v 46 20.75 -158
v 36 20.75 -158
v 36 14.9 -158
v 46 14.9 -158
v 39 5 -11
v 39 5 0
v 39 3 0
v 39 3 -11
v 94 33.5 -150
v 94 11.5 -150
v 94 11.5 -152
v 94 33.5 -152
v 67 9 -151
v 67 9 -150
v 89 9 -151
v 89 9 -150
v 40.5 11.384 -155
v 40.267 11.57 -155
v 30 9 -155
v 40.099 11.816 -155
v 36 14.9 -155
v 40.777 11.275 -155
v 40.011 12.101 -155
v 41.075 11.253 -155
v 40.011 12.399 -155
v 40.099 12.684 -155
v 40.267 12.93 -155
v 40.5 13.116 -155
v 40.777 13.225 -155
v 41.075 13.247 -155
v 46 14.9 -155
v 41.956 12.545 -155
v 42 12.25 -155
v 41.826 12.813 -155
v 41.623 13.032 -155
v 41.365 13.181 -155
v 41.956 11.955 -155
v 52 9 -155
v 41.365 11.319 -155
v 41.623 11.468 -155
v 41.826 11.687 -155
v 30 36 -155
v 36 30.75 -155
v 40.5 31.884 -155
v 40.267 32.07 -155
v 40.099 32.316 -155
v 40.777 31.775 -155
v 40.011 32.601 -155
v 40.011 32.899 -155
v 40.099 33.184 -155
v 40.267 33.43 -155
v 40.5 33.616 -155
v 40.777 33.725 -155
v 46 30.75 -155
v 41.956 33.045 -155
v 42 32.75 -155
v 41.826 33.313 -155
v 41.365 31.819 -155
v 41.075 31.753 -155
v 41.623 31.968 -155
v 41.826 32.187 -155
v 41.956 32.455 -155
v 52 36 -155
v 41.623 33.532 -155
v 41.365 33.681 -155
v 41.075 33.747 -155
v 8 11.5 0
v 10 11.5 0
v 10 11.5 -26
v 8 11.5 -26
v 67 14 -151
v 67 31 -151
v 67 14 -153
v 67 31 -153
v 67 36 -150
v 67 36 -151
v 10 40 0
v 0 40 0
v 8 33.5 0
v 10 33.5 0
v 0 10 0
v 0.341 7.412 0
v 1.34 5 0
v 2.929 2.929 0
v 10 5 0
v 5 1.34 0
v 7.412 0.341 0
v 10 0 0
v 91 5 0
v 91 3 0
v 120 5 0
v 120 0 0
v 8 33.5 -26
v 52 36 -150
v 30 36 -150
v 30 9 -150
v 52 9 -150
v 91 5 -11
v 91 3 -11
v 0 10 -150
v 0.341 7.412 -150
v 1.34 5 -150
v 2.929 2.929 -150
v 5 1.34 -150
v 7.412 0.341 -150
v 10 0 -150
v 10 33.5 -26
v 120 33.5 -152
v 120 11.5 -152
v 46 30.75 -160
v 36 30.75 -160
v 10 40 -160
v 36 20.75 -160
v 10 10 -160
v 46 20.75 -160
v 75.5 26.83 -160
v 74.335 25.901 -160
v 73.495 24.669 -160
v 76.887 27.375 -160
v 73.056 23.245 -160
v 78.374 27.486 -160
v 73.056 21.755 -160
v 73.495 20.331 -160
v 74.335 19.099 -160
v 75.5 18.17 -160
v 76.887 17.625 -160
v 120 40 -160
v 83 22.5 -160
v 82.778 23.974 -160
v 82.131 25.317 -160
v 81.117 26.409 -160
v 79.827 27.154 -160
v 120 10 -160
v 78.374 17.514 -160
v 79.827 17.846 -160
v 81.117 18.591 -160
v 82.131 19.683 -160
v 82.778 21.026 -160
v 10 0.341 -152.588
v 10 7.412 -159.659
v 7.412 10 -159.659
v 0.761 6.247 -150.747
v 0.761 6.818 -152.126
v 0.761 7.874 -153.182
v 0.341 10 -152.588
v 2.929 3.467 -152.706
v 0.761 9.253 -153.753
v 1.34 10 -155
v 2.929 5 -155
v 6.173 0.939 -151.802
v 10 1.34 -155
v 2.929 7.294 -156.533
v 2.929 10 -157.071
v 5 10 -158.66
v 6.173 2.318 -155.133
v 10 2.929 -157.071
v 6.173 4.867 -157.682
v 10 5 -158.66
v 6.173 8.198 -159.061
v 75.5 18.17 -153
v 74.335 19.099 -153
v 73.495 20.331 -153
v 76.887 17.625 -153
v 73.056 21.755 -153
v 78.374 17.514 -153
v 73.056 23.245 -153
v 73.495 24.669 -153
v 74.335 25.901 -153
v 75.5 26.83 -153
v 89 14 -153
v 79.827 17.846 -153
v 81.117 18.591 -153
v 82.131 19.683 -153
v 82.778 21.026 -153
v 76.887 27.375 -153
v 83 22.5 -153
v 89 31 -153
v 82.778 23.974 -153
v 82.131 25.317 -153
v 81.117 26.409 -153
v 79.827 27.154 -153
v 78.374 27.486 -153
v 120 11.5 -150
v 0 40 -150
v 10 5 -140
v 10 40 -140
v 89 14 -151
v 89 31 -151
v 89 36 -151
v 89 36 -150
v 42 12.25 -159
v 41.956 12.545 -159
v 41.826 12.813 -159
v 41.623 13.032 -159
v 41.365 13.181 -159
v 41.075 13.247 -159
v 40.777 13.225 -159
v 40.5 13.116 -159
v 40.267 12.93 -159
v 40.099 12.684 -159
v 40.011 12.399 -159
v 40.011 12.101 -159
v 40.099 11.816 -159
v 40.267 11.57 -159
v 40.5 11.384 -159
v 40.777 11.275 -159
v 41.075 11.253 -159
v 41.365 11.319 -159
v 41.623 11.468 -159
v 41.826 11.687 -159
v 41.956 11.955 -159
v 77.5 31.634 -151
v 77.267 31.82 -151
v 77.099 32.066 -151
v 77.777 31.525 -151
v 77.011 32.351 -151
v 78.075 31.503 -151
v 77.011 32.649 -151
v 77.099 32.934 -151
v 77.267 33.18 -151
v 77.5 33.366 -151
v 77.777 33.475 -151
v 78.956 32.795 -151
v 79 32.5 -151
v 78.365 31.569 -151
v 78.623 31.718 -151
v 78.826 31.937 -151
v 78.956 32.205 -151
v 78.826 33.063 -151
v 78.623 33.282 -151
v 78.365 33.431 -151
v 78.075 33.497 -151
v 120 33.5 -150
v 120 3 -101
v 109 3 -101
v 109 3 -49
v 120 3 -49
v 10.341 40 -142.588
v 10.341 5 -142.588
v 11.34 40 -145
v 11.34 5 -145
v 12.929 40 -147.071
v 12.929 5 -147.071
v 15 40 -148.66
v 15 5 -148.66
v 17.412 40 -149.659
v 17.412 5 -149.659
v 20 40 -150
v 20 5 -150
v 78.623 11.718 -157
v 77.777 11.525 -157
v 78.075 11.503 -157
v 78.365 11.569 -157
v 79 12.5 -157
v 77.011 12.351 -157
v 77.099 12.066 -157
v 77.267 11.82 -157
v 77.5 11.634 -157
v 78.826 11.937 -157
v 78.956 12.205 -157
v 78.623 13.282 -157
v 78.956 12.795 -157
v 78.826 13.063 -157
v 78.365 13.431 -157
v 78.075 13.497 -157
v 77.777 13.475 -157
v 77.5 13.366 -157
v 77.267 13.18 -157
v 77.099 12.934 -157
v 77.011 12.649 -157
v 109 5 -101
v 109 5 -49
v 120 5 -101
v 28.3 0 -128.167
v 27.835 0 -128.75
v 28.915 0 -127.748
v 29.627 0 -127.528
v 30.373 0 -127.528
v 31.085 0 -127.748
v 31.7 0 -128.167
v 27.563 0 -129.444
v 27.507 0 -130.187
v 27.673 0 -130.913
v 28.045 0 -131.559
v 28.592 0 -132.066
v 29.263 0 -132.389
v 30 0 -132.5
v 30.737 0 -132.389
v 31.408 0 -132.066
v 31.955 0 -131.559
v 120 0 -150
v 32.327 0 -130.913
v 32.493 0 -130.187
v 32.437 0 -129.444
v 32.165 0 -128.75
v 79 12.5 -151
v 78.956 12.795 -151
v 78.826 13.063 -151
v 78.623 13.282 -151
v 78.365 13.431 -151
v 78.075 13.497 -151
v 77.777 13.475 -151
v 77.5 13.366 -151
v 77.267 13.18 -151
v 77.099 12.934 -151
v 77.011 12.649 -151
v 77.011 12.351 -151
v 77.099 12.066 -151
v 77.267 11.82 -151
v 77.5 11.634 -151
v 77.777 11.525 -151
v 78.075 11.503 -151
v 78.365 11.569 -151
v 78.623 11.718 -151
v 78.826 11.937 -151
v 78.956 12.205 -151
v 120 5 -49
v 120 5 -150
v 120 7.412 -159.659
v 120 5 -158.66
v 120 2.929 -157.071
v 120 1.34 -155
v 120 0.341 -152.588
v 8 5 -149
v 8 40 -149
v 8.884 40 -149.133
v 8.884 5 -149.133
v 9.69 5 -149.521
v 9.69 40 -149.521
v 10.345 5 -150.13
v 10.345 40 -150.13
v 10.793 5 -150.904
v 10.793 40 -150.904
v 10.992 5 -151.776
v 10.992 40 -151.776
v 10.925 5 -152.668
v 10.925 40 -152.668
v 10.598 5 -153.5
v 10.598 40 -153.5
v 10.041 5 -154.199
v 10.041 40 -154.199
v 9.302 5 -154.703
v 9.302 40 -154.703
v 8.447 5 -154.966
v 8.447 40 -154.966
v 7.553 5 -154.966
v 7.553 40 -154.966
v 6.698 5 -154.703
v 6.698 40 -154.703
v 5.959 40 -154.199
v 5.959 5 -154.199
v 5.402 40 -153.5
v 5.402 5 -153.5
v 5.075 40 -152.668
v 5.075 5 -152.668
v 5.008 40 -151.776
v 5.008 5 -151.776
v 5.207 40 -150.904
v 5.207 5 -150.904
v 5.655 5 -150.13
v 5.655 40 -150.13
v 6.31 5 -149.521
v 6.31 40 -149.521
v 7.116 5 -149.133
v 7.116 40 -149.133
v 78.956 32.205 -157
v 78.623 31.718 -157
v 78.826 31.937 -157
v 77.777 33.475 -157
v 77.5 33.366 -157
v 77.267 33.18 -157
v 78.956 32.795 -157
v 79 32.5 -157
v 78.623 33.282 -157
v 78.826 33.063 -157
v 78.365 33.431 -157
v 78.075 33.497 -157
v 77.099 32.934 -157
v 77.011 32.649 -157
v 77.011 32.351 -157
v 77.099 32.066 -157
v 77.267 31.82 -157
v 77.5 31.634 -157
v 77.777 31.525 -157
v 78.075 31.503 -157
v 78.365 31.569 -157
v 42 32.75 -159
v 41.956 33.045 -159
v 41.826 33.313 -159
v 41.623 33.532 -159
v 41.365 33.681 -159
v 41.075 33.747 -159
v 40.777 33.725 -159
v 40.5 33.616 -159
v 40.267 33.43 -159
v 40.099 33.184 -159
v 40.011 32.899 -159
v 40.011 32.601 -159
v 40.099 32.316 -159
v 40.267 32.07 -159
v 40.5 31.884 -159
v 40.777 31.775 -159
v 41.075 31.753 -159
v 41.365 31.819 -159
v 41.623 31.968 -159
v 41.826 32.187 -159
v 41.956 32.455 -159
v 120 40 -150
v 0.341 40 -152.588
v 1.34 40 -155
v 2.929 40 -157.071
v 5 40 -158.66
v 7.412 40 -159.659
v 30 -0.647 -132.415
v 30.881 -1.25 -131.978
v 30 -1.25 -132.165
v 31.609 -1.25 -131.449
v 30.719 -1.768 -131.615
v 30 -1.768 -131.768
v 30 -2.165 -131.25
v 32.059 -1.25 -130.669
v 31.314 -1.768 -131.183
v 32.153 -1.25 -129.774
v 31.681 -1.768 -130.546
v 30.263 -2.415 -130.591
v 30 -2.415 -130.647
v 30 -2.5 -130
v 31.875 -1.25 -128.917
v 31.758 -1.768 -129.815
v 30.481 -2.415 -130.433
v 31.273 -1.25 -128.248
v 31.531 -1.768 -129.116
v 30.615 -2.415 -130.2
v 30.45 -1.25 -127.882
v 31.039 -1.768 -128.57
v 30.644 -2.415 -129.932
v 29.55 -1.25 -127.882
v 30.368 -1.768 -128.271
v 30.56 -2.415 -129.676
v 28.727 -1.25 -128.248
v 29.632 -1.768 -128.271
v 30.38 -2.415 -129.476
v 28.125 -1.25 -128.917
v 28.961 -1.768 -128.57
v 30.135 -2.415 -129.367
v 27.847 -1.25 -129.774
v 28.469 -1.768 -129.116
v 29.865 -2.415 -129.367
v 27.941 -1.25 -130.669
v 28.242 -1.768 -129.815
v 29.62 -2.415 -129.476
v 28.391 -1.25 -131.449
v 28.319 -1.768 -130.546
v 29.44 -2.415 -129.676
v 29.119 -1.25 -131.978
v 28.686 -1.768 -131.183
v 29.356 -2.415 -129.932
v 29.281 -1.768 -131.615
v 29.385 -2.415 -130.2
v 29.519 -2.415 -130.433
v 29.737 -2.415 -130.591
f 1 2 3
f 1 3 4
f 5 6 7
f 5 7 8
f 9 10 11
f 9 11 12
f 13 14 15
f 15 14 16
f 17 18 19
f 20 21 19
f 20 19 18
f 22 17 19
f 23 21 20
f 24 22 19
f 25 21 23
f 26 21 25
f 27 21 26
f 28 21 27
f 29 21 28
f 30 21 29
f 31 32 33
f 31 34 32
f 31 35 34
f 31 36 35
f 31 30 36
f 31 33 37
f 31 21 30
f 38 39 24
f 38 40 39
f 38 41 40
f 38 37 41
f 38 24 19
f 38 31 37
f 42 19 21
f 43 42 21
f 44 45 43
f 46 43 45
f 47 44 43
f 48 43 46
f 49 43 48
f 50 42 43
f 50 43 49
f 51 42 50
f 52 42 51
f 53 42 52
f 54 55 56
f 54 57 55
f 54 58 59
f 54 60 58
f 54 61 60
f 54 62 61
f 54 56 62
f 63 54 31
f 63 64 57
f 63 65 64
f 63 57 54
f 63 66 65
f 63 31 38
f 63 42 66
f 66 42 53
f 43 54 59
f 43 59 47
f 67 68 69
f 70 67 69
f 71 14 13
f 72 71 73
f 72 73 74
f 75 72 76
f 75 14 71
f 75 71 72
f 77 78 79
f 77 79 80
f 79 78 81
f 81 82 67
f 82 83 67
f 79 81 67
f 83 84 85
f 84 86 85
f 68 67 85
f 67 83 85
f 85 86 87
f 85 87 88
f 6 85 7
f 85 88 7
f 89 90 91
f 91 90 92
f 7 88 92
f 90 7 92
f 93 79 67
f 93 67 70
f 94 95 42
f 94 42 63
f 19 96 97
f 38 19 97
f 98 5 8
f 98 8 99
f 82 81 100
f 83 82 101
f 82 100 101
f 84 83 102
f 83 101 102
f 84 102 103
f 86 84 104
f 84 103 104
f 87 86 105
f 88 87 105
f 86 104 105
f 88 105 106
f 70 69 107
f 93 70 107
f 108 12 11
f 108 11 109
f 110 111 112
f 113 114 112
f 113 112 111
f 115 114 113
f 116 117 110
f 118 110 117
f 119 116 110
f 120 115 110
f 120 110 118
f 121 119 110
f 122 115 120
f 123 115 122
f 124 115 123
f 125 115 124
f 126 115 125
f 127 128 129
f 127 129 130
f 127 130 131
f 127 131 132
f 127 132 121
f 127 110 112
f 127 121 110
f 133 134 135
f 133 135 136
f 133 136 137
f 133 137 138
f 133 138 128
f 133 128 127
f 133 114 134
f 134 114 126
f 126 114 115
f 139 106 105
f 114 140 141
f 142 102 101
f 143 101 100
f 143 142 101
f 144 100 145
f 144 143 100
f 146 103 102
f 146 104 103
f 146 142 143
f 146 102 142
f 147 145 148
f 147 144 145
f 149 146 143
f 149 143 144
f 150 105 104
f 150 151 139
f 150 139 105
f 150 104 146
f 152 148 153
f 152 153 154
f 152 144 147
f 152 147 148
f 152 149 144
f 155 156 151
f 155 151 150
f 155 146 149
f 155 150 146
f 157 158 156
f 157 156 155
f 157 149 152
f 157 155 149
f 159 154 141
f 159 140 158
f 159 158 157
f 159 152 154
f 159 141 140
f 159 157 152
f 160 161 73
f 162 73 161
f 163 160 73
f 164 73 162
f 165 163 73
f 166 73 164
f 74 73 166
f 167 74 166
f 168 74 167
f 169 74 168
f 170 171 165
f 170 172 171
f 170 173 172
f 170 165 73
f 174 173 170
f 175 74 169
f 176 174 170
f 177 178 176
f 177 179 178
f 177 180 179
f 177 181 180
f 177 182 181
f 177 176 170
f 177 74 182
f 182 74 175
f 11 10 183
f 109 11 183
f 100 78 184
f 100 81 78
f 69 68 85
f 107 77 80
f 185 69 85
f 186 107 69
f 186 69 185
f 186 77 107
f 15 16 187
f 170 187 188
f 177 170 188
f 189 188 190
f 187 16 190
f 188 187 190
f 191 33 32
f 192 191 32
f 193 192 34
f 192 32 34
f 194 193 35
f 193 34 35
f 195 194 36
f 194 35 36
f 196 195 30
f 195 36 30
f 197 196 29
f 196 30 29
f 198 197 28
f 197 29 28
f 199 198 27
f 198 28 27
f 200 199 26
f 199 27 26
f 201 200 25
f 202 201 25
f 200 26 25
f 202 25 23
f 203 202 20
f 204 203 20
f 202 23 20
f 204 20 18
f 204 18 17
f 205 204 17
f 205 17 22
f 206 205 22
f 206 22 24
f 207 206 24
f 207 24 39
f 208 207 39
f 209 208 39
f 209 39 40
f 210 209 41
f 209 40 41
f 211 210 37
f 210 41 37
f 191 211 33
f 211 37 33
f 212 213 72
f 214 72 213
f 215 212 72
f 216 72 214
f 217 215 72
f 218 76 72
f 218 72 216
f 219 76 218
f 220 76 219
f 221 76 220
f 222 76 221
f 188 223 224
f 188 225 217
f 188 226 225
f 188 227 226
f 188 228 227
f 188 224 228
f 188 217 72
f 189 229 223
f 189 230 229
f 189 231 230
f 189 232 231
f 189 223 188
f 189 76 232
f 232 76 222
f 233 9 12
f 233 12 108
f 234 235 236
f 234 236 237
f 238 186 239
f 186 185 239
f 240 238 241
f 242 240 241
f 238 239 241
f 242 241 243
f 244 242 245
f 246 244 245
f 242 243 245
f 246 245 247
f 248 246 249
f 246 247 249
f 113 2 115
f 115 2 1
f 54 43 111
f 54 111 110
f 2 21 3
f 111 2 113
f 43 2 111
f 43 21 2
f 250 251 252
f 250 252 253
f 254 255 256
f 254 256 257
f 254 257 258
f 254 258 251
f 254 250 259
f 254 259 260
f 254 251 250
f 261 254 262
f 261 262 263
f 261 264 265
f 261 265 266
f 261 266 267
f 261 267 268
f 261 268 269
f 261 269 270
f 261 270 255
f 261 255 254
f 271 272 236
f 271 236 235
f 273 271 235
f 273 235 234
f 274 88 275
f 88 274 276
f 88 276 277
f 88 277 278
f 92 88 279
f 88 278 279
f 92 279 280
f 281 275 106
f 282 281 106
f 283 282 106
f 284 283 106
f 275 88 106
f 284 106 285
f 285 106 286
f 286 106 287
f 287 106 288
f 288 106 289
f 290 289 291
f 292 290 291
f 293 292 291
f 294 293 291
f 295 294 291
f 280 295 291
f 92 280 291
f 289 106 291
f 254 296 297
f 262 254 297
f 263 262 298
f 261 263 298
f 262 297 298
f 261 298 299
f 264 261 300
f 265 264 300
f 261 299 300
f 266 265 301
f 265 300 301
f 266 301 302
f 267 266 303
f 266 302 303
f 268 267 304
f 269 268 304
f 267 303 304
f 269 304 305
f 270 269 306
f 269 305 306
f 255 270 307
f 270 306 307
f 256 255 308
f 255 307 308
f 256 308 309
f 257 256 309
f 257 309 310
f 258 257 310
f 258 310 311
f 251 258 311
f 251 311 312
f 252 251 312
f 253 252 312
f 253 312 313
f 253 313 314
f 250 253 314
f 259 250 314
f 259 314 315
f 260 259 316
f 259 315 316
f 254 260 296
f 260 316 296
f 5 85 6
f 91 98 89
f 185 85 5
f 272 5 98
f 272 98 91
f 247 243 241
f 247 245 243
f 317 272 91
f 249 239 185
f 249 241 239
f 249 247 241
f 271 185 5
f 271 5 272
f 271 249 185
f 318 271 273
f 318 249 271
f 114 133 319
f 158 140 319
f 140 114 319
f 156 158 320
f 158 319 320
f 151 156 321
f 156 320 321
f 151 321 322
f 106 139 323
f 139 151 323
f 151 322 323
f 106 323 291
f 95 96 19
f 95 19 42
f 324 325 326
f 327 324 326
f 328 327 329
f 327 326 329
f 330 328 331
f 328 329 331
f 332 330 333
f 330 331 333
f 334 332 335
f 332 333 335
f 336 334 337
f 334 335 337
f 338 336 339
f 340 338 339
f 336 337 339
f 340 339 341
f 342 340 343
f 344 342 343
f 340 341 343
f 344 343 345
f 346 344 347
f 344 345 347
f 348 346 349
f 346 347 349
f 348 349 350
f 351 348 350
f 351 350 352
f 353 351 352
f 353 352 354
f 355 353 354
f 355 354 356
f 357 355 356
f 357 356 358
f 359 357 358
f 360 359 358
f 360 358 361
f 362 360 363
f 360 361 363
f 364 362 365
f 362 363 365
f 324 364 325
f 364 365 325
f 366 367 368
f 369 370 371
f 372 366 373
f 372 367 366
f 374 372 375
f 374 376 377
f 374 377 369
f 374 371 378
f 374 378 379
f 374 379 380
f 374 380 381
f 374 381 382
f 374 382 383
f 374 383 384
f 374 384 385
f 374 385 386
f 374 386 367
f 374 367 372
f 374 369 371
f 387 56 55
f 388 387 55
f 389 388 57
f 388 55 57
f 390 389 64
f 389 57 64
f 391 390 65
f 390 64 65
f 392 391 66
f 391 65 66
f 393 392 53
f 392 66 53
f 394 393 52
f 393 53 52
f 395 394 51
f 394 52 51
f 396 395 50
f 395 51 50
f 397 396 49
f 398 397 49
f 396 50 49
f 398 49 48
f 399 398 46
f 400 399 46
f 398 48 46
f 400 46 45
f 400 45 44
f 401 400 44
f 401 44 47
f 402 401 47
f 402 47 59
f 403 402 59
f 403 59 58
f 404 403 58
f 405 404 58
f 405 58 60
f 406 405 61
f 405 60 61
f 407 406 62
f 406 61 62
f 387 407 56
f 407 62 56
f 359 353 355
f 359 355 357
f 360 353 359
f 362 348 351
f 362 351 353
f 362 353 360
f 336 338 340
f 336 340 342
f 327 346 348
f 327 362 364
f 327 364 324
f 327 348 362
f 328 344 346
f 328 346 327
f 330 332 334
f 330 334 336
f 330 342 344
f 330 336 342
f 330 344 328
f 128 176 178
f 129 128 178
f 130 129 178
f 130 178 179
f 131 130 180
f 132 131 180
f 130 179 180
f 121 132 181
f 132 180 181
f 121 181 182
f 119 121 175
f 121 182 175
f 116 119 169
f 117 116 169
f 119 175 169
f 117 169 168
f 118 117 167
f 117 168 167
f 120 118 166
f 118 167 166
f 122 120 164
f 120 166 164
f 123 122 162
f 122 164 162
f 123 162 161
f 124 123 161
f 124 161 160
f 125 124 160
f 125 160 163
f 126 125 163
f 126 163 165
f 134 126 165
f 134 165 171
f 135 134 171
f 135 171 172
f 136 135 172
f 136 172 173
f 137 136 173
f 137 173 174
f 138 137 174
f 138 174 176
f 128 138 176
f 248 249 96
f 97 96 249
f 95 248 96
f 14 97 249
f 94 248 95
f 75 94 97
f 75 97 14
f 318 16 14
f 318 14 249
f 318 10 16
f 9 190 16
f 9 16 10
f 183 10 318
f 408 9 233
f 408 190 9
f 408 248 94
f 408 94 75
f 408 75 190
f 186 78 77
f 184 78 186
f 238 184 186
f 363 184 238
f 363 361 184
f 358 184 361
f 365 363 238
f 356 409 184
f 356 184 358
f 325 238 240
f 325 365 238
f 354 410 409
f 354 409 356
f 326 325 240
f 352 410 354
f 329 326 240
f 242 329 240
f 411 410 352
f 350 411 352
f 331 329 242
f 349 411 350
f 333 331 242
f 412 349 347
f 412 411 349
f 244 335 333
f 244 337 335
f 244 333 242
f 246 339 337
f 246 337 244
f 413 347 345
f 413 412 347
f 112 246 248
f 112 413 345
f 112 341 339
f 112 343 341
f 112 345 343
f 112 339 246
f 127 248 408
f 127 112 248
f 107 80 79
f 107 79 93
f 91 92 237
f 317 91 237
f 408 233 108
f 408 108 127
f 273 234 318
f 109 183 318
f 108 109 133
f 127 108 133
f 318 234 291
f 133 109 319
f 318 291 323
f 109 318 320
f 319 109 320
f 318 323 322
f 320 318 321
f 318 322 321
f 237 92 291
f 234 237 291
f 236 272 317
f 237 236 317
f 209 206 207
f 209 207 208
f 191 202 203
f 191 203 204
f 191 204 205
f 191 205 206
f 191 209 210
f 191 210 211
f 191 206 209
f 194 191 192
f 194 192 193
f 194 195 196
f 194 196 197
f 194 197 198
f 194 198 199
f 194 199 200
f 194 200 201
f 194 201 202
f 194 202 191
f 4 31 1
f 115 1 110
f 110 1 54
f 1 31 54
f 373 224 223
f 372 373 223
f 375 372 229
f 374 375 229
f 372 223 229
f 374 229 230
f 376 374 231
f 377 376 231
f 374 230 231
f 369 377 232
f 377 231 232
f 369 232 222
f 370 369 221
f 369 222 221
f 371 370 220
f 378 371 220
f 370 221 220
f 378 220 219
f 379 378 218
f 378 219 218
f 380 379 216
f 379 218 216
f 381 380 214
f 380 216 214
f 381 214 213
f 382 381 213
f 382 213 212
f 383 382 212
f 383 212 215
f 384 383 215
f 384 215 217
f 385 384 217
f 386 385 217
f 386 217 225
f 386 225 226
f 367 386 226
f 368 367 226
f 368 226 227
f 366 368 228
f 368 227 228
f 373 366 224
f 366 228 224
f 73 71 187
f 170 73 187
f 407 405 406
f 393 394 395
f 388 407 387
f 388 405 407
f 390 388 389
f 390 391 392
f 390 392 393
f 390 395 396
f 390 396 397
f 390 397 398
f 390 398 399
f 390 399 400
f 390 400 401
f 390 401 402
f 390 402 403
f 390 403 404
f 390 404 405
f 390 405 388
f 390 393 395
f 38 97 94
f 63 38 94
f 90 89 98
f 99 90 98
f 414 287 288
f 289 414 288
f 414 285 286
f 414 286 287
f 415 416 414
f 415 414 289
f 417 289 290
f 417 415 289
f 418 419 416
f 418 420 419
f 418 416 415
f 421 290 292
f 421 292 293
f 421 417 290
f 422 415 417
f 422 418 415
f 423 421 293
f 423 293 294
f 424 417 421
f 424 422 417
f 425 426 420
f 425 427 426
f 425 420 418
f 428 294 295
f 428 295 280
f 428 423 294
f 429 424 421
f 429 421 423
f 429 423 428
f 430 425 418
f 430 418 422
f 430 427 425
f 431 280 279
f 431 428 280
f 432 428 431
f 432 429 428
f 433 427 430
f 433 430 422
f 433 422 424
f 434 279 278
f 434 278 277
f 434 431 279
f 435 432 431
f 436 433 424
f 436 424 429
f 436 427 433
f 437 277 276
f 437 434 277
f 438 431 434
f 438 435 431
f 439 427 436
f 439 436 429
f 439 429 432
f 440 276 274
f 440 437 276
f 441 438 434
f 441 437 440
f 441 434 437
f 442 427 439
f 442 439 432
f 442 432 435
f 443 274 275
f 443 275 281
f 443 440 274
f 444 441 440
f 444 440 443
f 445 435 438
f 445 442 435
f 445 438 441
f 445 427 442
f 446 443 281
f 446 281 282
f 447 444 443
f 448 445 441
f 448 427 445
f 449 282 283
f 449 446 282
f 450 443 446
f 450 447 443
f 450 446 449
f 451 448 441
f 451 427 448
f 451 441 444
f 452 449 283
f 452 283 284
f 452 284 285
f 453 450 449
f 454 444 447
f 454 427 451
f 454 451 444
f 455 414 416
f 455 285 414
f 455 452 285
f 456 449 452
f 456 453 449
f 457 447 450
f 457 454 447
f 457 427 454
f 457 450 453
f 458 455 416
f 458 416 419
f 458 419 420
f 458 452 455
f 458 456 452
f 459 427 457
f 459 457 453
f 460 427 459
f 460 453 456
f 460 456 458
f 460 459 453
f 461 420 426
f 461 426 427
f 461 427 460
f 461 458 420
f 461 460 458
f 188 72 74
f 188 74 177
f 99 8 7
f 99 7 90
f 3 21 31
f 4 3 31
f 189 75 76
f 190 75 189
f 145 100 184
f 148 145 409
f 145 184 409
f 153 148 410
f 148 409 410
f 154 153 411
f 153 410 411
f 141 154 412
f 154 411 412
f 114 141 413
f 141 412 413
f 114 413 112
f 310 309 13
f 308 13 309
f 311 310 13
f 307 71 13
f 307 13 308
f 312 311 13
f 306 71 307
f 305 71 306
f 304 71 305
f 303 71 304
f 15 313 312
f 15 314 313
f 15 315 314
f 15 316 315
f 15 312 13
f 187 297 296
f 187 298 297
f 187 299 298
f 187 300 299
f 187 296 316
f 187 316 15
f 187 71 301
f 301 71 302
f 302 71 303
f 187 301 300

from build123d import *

# Parameters (mm, degrees)
ESQUISSE1_W              = 120
ESQUISSE1_H              = 160
BOSS_EXTRU_1_DEPTH       = 40
ESQUISSE2_W              = 110
ESQUISSE2_H              = 150
ENL_V_MAT_EXTRU_1_DEPTH  = 35
CONG_1_R                 = 10
CONG_2_R                 = 10
CONG_3_R                 = 10
ESQUISSE3_R              = 2.5
BOSS_EXTRU_2_DEPTH       = 2.5
CONG_4_R                 = 2.5
ESQUISSE4_R              = 3
ENL_V_MAT_EXTRU_2_DEPTH  = 35
ESQUISSE5_W              = 11
ESQUISSE5_H              = 52
ENL_V_MAT_EXTRU_3_DEPTH  = 2
ESQUISSE6_W              = 52
ESQUISSE6_H              = 11
ENL_V_MAT_EXTRU_4_DEPTH  = 2
ESQUISSE8_W              = 22
ESQUISSE8_H              = 27
ENL_V_MAT_EXTRU_6_DEPTH  = 5
ESQUISSE10_R             = 1
ENL_V_MAT_EXTRU_7_DEPTH  = 4
ESQUISSE11_W             = 10
ESQUISSE11_H             = 10
ENL_V_MAT_EXTRU_8_DEPTH  = 201.062490237
ESQUISSE12_W             = 10
ESQUISSE12_H             = 5.85
ENL_V_MAT_EXTRU_9_DEPTH  = 3
ESQUISSE13_W             = 22
ESQUISSE13_H             = 27
ENL_V_MAT_EXTRU_10_DEPTH = 1
ESQUISSE14_R             = 1
ENL_V_MAT_EXTRU_11_DEPTH = 6
ESQUISSE15_R             = 5
ENL_V_MAT_EXTRU_12_DEPTH = 197.979694385
ESQUISSE16_W             = 22
ESQUISSE16_H             = 17
ENL_V_MAT_EXTRU_13_DEPTH = 2
ESQUISSE17_W             = 26
ESQUISSE17_H             = 22
ENL_V_MAT_EXTRU_14_DEPTH = 2
ESQUISSE18_W             = 26
ESQUISSE18_H             = 22
ENL_V_MAT_EXTRU_15_DEPTH = 2


with BuildPart() as part:
    # Esquisse1 → Boss.-Extru.1 (new body)
    with BuildSketch(Plane(origin=(0, 0, 0), x_dir=(1, 0, 0), z_dir=(0, 1, 0))):
        with Locations((60, 80)):
            Rectangle(ESQUISSE1_W, ESQUISSE1_H)
    extrude(amount=BOSS_EXTRU_1_DEPTH)

    # Esquisse2 → Enlèv. mat.-Extru.1 (cut)
    with BuildSketch(Plane(origin=(0, 40, 0), x_dir=(1, 0, 0), z_dir=(0, 1, 0))):
        with Locations((65, 75)):
            Rectangle(ESQUISSE2_W, ESQUISSE2_H)
    extrude(amount=-ENL_V_MAT_EXTRU_1_DEPTH, mode=Mode.SUBTRACT)

    # Congé1
    cong_1_edges = [part.edges().sort_by_distance(p)[0] for p in [
        (60, 0, -160),
    ]]
    fillet(cong_1_edges, radius=CONG_1_R)

    # Congé2
    cong_2_edges = [part.edges().sort_by_distance(p)[0] for p in [
        (0, 0, -75),
        (0, 2.928932188, -157.071067812),
        (0, 25, -160),
    ]]
    fillet(cong_2_edges, radius=CONG_2_R)

    # Congé3
    cong_3_edges = [part.edges().sort_by_distance(p)[0] for p in [
        (10, 22.5, -150),
    ]]
    fillet(cong_3_edges, radius=CONG_3_R)

    # Esquisse3 → Boss.-Extru.2 (add)
    with BuildSketch(Plane.XZ):
        with Locations(Location((30, -130, 0), (0, 0, 270))):
            Circle(ESQUISSE3_R)
    extrude(amount=BOSS_EXTRU_2_DEPTH)

    # Congé4
    cong_4_edges = [part.edges().sort_by_distance(p)[0] for p in [
        (30, -2.5, -127.5),
    ]]
    fillet(cong_4_edges, radius=CONG_4_R - 0.0001)  # a hair under: the kernel refuses the full size

    # Esquisse4 → Enlèv. mat.-Extru.2 (cut)
    with BuildSketch(Plane(origin=(0, 40, 0), x_dir=(1, 0, 0), z_dir=(0, 1, 0))):
        with Locations(Location((8, 152, 0), (0, 0, 270))):
            Circle(ESQUISSE4_R)
    extrude(amount=-ENL_V_MAT_EXTRU_2_DEPTH, mode=Mode.SUBTRACT)

    # Esquisse5 → Enlèv. mat.-Extru.3 (cut)
    with BuildSketch(Plane(origin=(0, 5, 0), x_dir=(1, 0, 0), z_dir=(0, 1, 0))):
        with Locations((114.5, 75)):
            Rectangle(ESQUISSE5_W, ESQUISSE5_H)
    extrude(amount=-ENL_V_MAT_EXTRU_3_DEPTH, mode=Mode.SUBTRACT)

    # Esquisse6 → Enlèv. mat.-Extru.4 (cut)
    with BuildSketch(Plane(origin=(0, 5, 0), x_dir=(1, 0, 0), z_dir=(0, 1, 0))):
        with Locations((65, 5.5)):
            Rectangle(ESQUISSE6_W, ESQUISSE6_H)
    extrude(amount=-ENL_V_MAT_EXTRU_4_DEPTH, mode=Mode.SUBTRACT)

    # Esquisse8 → Enlèv. mat.-Extru.6 (cut)
    with BuildSketch(Plane.XY.offset(-150)):
        with Locations((41, 22.5)):
            Rectangle(ESQUISSE8_W, ESQUISSE8_H)
    extrude(amount=-ENL_V_MAT_EXTRU_6_DEPTH, mode=Mode.SUBTRACT)

    # Esquisse10 → Enlèv. mat.-Extru.7 (cut)
    with BuildSketch(Plane.XY.offset(-155)):
        with Locations((41, 32.75)):
            Circle(ESQUISSE10_R)
        with Locations((41, 12.25)):
            Circle(ESQUISSE10_R)
    extrude(amount=-ENL_V_MAT_EXTRU_7_DEPTH, mode=Mode.SUBTRACT)

    # Esquisse11 → Enlèv. mat.-Extru.8 (cut, through all)
    with BuildSketch(Plane.XY.offset(-155)):
        with Locations((41, 25.75)):
            Rectangle(ESQUISSE11_W, ESQUISSE11_H)
    extrude(amount=-ENL_V_MAT_EXTRU_8_DEPTH, mode=Mode.SUBTRACT)

    # Esquisse12 → Enlèv. mat.-Extru.9 (cut)
    with BuildSketch(Plane.XY.offset(-155)):
        with Locations((41, 17.825)):
            Rectangle(ESQUISSE12_W, ESQUISSE12_H)
    extrude(amount=-ENL_V_MAT_EXTRU_9_DEPTH, mode=Mode.SUBTRACT)

    # Esquisse13 → Enlèv. mat.-Extru.10 (cut)
    with BuildSketch(Plane.XY.offset(-150)):
        with Locations((78, 22.5)):
            Rectangle(ESQUISSE13_W, ESQUISSE13_H)
    extrude(amount=-ENL_V_MAT_EXTRU_10_DEPTH, mode=Mode.SUBTRACT)

    # Esquisse14 → Enlèv. mat.-Extru.11 (cut)
    with BuildSketch(Plane.XY.offset(-151)):
        with Locations((78, 32.5)):
            Circle(ESQUISSE14_R)
        with Locations((78, 12.5)):
            Circle(ESQUISSE14_R)
    extrude(amount=-ENL_V_MAT_EXTRU_11_DEPTH, mode=Mode.SUBTRACT)

    # Esquisse15 → Enlèv. mat.-Extru.12 (cut, through all)
    with BuildSketch(Plane.XY.offset(-151)):
        with Locations((78, 22.5)):
            Circle(ESQUISSE15_R)
    extrude(amount=-ENL_V_MAT_EXTRU_12_DEPTH, mode=Mode.SUBTRACT)

    # Esquisse16 → Enlèv. mat.-Extru.13 (cut)
    with BuildSketch(Plane.XY.offset(-151)):
        with Locations((78, 22.5)):
            Rectangle(ESQUISSE16_W, ESQUISSE16_H)
    extrude(amount=-ENL_V_MAT_EXTRU_13_DEPTH, mode=Mode.SUBTRACT)

    # Esquisse17 → Enlèv. mat.-Extru.14 (cut)
    with BuildSketch(Plane.XY.offset(-150)):
        with Locations((107, 22.5)):
            Rectangle(ESQUISSE17_W, ESQUISSE17_H)
    extrude(amount=-ENL_V_MAT_EXTRU_14_DEPTH, mode=Mode.SUBTRACT)

    # Esquisse18 → Enlèv. mat.-Extru.15 (cut)
    with BuildSketch(Plane(origin=(10, 0, 0), x_dir=(0, 0, -1), z_dir=(1, 0, 0))):
        with Locations((13, 22.5)):
            Rectangle(ESQUISSE18_W, ESQUISSE18_H)
    extrude(amount=-ENL_V_MAT_EXTRU_15_DEPTH, mode=Mode.SUBTRACT)


solid = part.part
